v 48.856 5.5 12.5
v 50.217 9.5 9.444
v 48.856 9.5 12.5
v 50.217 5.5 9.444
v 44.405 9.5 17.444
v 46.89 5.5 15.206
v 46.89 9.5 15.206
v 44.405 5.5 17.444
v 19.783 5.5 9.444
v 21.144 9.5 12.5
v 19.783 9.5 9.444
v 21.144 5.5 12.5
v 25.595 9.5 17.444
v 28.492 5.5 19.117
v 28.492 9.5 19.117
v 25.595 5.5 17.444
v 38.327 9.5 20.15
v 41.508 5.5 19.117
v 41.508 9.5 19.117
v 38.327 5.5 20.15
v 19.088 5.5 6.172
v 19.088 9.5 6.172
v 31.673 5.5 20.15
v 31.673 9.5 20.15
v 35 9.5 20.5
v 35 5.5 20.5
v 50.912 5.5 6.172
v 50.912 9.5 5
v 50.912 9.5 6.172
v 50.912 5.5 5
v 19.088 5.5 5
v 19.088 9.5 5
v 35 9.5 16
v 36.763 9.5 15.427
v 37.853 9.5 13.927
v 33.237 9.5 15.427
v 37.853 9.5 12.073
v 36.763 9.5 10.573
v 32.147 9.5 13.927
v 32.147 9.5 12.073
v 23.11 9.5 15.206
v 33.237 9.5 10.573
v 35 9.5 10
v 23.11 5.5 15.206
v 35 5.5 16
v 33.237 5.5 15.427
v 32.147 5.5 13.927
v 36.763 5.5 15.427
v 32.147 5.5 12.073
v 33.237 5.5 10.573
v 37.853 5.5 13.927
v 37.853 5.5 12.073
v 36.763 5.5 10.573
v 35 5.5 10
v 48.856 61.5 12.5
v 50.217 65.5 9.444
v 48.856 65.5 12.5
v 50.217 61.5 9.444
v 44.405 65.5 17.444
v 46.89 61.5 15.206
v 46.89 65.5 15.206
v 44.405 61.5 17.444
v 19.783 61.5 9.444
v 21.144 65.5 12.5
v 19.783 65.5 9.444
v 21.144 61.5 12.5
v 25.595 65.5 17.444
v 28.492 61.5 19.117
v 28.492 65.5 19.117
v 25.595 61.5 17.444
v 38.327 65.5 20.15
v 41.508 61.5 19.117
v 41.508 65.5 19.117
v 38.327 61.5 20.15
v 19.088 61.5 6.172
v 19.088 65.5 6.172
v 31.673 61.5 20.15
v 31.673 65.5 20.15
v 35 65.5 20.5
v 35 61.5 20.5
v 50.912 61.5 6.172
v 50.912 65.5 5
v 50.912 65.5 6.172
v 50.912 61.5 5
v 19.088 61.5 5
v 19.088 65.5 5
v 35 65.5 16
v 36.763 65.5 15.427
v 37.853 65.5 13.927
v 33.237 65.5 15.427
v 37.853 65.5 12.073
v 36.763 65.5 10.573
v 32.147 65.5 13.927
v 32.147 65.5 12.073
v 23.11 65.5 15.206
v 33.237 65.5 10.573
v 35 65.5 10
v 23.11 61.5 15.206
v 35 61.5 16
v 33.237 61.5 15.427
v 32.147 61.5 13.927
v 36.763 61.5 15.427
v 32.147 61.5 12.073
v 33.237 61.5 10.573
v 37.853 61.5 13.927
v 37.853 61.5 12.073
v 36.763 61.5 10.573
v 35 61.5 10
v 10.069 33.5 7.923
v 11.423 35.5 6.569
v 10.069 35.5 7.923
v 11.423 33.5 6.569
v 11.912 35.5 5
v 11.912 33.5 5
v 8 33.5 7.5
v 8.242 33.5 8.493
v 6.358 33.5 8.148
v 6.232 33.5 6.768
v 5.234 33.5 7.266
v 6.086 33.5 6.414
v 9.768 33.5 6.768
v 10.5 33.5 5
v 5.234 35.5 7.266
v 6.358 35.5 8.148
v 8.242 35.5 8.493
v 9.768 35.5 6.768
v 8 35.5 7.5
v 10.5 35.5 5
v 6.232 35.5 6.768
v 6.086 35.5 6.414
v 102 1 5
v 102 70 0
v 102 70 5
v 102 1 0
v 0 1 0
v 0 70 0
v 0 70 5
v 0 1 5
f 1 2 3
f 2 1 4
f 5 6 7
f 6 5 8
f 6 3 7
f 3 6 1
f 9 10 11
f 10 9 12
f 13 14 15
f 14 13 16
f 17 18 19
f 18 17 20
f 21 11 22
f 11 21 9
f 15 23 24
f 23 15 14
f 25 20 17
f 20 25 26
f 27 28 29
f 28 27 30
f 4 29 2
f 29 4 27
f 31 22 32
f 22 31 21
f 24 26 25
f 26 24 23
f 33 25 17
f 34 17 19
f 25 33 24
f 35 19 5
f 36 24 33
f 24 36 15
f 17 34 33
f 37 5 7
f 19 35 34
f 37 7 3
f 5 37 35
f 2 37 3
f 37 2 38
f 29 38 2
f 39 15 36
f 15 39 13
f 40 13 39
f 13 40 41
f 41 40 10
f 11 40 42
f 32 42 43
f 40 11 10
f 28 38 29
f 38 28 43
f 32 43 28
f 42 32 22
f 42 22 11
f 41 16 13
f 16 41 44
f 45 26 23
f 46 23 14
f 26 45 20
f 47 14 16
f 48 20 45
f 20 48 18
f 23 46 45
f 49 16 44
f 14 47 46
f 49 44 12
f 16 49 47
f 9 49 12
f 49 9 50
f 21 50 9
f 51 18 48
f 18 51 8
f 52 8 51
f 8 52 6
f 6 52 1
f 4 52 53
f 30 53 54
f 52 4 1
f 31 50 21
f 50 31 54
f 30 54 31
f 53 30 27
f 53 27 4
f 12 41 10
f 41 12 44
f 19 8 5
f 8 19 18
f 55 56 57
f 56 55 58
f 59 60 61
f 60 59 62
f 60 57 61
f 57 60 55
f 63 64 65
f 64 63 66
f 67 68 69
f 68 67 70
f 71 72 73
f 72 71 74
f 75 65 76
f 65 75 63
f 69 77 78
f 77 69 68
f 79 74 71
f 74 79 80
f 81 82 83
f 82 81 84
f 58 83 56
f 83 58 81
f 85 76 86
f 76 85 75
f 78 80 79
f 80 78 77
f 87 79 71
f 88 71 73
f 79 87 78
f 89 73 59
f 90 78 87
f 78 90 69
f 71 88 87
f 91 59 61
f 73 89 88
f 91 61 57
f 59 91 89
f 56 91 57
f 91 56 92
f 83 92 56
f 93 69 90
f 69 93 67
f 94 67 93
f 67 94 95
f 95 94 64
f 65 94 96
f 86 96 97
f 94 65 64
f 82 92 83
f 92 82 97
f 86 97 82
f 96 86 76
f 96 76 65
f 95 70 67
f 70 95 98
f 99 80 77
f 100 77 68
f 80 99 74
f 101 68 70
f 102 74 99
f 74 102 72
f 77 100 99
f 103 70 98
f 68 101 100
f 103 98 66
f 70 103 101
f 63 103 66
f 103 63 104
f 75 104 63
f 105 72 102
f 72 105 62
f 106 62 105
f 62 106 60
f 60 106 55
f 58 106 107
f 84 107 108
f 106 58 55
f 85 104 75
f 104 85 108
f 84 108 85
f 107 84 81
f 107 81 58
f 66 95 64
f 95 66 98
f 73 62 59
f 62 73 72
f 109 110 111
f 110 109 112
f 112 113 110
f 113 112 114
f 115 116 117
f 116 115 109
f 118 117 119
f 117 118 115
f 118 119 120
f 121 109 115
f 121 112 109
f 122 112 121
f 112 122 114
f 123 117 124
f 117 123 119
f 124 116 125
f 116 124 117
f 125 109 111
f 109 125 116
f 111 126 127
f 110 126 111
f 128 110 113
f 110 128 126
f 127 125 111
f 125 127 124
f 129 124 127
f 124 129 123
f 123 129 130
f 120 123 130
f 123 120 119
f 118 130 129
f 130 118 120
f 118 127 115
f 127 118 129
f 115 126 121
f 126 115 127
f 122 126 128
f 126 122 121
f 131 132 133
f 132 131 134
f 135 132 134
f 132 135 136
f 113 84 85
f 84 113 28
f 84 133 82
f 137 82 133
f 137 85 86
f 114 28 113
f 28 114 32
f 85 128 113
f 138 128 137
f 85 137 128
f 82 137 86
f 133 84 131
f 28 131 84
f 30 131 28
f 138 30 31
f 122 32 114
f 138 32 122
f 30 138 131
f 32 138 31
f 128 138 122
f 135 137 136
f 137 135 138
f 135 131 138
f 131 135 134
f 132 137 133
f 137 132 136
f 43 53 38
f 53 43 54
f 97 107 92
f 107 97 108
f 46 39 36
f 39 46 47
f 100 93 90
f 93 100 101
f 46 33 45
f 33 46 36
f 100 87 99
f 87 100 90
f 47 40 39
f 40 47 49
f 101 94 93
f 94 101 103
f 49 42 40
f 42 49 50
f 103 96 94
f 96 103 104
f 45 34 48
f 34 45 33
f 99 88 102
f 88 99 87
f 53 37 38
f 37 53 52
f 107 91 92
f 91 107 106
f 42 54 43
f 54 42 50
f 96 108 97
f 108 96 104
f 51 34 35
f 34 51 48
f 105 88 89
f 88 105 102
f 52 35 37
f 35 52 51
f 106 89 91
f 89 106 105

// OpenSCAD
base_plate_width = 100;
base_plate_length = 80;
base_plate_height = 3;
base_plate_dimensions = [base_plate_width,base_plate_length,base_plate_height];

loch_bodenplatte_width = 60;
loch_bodenplatte_length = 50;
loch_bodenplatte_height = 10;
loch_bodenplatte_dimensions = [loch_bodenplatte_width, loch_bodenplatte_length, loch_bodenplatte_height];

up_plate_width = 5;
up_plate_length = 70;
up_plate_height = 30;
up_plate_dimensions = [up_plate_width,up_plate_length,up_plate_height];

wall_plate_width= 100;
wall_plate_length = 5;
wall_plate_height = 50;
wall_plate_dimensions = [wall_plate_width,wall_plate_length,wall_plate_height];


cylinder_radius = 15;
cylinder_height = 5;
base2_plate_width = 102;
base2_plate_length = 69;
base2_plate_height = 5;
base2_plate_dimensions = [base2_plate_width,base2_plate_length,base2_plate_height];


cylinder2_radius = 16;
cylinder2_height = 4;



module halfcylinder(he,rd) {
	difference(){
		cylinder (h=he,r=rd);
		translate([0,-rd-0.1,-0.1]) cube([rd+0.1,rd*2+0.2,he+0.2]);
	} // df
} // mod

t=1000;
$vpt=[t*$t,t*$t,t*$t];
r=1000;
$vpr=[r*$t,r*$t,r*$t];
d=10;
$vpd=200+d*$t;
echo(d=d,"$vpr=",$vpr,"$vpd=",$vpd,"$vpt=",$vpt);

/*


//projection(){

translate([0,70,55])
rotate([180,0,0])
difference(){
	union(){
		
		translate([0,0,50])
		difference(){
			cube(base2_plate_dimensions);
			
			translate([20, 10, -3])
			cube(loch_bodenplatte_dimensions);
		}
		translate([19.5,0,34])
		//color("green")
		cube([15, 4, 12]);
		
		translate([19.5,65,34])
		//color("green")
		cube([15, 4, 12]);
		
		
		translate([19,0,37])
		color("white")
		cube([cylinder2_radius*2, cylinder2_height, 16]);
		
		rotate([270,270,0])
		translate([50,35,base2_plate_length-4])
		halfcylinder(cylinder2_height,cylinder2_radius);

		translate([19,base2_plate_length-4,37])
		color("black")
		cube([cylinder2_radius*2, cylinder2_height, 16]);
		
		rotate([270,270,0])
		translate([50,35,0])
		halfcylinder(cylinder2_height,cylinder2_radius);
		
		translate([8, base2_plate_length/2, 51])		
		difference(){	
			
			rotate([90,-45,180])
		//	color("red")
			halfcylinder(2,4);
			
			translate([0,0,-0.5])
			rotate([90,90,0])
		//	color("black")
			cylinder(d = 5, h=20, center = true);	
			}
	}	
	
	difference(){
		translate([35,-10,cylinder2_radius*2+10])
		//color("blue")
		rotate([270,90,0])
		cylinder(h=120, r=3);
		
	}
	
	
//}
}*/




//projection(){
//translate([0,0,-16.5])
rotate([180,0,0])
translate([0, -70,-42.5])
	//rotate([90,0,0])
difference(){
	union(){
		
		translate([0,0,37.5])
		cube(base2_plate_dimensions);
		
		
		
		rotate([270,270,0])
		translate([38,35,base2_plate_length-8.5])
		halfcylinder(cylinder2_height,cylinder2_radius);

		
		
		rotate([270,270,0])
		translate([38,35,4.5])
		halfcylinder(cylinder2_height,cylinder2_radius);
		
		translate([8, base2_plate_length/2, 38])		
		difference(){	
			
			rotate([90,-45,180])
			//color("blue")
			halfcylinder(2,4);
			
			translate([0,0,-0.5])
			rotate([90,90,0])
			cylinder(d = 5, h=20, center = true);	
			}
	}	
	
	translate([35,-10,cylinder2_radius*2-2.5])
	color("yellow")
	rotate([270,90,0])
	cylinder(h=120, r=3);
	
	/*translate([19,4.5,37])
		color("white")
		cube([cylinder2_radius*2, cylinder2_height, 16]);
	
	
		translate([19,base2_plate_length-8.5,37])
		color("black")
		cube([cylinder2_radius*2, cylinder2_height, 16]);*/
//}


}
